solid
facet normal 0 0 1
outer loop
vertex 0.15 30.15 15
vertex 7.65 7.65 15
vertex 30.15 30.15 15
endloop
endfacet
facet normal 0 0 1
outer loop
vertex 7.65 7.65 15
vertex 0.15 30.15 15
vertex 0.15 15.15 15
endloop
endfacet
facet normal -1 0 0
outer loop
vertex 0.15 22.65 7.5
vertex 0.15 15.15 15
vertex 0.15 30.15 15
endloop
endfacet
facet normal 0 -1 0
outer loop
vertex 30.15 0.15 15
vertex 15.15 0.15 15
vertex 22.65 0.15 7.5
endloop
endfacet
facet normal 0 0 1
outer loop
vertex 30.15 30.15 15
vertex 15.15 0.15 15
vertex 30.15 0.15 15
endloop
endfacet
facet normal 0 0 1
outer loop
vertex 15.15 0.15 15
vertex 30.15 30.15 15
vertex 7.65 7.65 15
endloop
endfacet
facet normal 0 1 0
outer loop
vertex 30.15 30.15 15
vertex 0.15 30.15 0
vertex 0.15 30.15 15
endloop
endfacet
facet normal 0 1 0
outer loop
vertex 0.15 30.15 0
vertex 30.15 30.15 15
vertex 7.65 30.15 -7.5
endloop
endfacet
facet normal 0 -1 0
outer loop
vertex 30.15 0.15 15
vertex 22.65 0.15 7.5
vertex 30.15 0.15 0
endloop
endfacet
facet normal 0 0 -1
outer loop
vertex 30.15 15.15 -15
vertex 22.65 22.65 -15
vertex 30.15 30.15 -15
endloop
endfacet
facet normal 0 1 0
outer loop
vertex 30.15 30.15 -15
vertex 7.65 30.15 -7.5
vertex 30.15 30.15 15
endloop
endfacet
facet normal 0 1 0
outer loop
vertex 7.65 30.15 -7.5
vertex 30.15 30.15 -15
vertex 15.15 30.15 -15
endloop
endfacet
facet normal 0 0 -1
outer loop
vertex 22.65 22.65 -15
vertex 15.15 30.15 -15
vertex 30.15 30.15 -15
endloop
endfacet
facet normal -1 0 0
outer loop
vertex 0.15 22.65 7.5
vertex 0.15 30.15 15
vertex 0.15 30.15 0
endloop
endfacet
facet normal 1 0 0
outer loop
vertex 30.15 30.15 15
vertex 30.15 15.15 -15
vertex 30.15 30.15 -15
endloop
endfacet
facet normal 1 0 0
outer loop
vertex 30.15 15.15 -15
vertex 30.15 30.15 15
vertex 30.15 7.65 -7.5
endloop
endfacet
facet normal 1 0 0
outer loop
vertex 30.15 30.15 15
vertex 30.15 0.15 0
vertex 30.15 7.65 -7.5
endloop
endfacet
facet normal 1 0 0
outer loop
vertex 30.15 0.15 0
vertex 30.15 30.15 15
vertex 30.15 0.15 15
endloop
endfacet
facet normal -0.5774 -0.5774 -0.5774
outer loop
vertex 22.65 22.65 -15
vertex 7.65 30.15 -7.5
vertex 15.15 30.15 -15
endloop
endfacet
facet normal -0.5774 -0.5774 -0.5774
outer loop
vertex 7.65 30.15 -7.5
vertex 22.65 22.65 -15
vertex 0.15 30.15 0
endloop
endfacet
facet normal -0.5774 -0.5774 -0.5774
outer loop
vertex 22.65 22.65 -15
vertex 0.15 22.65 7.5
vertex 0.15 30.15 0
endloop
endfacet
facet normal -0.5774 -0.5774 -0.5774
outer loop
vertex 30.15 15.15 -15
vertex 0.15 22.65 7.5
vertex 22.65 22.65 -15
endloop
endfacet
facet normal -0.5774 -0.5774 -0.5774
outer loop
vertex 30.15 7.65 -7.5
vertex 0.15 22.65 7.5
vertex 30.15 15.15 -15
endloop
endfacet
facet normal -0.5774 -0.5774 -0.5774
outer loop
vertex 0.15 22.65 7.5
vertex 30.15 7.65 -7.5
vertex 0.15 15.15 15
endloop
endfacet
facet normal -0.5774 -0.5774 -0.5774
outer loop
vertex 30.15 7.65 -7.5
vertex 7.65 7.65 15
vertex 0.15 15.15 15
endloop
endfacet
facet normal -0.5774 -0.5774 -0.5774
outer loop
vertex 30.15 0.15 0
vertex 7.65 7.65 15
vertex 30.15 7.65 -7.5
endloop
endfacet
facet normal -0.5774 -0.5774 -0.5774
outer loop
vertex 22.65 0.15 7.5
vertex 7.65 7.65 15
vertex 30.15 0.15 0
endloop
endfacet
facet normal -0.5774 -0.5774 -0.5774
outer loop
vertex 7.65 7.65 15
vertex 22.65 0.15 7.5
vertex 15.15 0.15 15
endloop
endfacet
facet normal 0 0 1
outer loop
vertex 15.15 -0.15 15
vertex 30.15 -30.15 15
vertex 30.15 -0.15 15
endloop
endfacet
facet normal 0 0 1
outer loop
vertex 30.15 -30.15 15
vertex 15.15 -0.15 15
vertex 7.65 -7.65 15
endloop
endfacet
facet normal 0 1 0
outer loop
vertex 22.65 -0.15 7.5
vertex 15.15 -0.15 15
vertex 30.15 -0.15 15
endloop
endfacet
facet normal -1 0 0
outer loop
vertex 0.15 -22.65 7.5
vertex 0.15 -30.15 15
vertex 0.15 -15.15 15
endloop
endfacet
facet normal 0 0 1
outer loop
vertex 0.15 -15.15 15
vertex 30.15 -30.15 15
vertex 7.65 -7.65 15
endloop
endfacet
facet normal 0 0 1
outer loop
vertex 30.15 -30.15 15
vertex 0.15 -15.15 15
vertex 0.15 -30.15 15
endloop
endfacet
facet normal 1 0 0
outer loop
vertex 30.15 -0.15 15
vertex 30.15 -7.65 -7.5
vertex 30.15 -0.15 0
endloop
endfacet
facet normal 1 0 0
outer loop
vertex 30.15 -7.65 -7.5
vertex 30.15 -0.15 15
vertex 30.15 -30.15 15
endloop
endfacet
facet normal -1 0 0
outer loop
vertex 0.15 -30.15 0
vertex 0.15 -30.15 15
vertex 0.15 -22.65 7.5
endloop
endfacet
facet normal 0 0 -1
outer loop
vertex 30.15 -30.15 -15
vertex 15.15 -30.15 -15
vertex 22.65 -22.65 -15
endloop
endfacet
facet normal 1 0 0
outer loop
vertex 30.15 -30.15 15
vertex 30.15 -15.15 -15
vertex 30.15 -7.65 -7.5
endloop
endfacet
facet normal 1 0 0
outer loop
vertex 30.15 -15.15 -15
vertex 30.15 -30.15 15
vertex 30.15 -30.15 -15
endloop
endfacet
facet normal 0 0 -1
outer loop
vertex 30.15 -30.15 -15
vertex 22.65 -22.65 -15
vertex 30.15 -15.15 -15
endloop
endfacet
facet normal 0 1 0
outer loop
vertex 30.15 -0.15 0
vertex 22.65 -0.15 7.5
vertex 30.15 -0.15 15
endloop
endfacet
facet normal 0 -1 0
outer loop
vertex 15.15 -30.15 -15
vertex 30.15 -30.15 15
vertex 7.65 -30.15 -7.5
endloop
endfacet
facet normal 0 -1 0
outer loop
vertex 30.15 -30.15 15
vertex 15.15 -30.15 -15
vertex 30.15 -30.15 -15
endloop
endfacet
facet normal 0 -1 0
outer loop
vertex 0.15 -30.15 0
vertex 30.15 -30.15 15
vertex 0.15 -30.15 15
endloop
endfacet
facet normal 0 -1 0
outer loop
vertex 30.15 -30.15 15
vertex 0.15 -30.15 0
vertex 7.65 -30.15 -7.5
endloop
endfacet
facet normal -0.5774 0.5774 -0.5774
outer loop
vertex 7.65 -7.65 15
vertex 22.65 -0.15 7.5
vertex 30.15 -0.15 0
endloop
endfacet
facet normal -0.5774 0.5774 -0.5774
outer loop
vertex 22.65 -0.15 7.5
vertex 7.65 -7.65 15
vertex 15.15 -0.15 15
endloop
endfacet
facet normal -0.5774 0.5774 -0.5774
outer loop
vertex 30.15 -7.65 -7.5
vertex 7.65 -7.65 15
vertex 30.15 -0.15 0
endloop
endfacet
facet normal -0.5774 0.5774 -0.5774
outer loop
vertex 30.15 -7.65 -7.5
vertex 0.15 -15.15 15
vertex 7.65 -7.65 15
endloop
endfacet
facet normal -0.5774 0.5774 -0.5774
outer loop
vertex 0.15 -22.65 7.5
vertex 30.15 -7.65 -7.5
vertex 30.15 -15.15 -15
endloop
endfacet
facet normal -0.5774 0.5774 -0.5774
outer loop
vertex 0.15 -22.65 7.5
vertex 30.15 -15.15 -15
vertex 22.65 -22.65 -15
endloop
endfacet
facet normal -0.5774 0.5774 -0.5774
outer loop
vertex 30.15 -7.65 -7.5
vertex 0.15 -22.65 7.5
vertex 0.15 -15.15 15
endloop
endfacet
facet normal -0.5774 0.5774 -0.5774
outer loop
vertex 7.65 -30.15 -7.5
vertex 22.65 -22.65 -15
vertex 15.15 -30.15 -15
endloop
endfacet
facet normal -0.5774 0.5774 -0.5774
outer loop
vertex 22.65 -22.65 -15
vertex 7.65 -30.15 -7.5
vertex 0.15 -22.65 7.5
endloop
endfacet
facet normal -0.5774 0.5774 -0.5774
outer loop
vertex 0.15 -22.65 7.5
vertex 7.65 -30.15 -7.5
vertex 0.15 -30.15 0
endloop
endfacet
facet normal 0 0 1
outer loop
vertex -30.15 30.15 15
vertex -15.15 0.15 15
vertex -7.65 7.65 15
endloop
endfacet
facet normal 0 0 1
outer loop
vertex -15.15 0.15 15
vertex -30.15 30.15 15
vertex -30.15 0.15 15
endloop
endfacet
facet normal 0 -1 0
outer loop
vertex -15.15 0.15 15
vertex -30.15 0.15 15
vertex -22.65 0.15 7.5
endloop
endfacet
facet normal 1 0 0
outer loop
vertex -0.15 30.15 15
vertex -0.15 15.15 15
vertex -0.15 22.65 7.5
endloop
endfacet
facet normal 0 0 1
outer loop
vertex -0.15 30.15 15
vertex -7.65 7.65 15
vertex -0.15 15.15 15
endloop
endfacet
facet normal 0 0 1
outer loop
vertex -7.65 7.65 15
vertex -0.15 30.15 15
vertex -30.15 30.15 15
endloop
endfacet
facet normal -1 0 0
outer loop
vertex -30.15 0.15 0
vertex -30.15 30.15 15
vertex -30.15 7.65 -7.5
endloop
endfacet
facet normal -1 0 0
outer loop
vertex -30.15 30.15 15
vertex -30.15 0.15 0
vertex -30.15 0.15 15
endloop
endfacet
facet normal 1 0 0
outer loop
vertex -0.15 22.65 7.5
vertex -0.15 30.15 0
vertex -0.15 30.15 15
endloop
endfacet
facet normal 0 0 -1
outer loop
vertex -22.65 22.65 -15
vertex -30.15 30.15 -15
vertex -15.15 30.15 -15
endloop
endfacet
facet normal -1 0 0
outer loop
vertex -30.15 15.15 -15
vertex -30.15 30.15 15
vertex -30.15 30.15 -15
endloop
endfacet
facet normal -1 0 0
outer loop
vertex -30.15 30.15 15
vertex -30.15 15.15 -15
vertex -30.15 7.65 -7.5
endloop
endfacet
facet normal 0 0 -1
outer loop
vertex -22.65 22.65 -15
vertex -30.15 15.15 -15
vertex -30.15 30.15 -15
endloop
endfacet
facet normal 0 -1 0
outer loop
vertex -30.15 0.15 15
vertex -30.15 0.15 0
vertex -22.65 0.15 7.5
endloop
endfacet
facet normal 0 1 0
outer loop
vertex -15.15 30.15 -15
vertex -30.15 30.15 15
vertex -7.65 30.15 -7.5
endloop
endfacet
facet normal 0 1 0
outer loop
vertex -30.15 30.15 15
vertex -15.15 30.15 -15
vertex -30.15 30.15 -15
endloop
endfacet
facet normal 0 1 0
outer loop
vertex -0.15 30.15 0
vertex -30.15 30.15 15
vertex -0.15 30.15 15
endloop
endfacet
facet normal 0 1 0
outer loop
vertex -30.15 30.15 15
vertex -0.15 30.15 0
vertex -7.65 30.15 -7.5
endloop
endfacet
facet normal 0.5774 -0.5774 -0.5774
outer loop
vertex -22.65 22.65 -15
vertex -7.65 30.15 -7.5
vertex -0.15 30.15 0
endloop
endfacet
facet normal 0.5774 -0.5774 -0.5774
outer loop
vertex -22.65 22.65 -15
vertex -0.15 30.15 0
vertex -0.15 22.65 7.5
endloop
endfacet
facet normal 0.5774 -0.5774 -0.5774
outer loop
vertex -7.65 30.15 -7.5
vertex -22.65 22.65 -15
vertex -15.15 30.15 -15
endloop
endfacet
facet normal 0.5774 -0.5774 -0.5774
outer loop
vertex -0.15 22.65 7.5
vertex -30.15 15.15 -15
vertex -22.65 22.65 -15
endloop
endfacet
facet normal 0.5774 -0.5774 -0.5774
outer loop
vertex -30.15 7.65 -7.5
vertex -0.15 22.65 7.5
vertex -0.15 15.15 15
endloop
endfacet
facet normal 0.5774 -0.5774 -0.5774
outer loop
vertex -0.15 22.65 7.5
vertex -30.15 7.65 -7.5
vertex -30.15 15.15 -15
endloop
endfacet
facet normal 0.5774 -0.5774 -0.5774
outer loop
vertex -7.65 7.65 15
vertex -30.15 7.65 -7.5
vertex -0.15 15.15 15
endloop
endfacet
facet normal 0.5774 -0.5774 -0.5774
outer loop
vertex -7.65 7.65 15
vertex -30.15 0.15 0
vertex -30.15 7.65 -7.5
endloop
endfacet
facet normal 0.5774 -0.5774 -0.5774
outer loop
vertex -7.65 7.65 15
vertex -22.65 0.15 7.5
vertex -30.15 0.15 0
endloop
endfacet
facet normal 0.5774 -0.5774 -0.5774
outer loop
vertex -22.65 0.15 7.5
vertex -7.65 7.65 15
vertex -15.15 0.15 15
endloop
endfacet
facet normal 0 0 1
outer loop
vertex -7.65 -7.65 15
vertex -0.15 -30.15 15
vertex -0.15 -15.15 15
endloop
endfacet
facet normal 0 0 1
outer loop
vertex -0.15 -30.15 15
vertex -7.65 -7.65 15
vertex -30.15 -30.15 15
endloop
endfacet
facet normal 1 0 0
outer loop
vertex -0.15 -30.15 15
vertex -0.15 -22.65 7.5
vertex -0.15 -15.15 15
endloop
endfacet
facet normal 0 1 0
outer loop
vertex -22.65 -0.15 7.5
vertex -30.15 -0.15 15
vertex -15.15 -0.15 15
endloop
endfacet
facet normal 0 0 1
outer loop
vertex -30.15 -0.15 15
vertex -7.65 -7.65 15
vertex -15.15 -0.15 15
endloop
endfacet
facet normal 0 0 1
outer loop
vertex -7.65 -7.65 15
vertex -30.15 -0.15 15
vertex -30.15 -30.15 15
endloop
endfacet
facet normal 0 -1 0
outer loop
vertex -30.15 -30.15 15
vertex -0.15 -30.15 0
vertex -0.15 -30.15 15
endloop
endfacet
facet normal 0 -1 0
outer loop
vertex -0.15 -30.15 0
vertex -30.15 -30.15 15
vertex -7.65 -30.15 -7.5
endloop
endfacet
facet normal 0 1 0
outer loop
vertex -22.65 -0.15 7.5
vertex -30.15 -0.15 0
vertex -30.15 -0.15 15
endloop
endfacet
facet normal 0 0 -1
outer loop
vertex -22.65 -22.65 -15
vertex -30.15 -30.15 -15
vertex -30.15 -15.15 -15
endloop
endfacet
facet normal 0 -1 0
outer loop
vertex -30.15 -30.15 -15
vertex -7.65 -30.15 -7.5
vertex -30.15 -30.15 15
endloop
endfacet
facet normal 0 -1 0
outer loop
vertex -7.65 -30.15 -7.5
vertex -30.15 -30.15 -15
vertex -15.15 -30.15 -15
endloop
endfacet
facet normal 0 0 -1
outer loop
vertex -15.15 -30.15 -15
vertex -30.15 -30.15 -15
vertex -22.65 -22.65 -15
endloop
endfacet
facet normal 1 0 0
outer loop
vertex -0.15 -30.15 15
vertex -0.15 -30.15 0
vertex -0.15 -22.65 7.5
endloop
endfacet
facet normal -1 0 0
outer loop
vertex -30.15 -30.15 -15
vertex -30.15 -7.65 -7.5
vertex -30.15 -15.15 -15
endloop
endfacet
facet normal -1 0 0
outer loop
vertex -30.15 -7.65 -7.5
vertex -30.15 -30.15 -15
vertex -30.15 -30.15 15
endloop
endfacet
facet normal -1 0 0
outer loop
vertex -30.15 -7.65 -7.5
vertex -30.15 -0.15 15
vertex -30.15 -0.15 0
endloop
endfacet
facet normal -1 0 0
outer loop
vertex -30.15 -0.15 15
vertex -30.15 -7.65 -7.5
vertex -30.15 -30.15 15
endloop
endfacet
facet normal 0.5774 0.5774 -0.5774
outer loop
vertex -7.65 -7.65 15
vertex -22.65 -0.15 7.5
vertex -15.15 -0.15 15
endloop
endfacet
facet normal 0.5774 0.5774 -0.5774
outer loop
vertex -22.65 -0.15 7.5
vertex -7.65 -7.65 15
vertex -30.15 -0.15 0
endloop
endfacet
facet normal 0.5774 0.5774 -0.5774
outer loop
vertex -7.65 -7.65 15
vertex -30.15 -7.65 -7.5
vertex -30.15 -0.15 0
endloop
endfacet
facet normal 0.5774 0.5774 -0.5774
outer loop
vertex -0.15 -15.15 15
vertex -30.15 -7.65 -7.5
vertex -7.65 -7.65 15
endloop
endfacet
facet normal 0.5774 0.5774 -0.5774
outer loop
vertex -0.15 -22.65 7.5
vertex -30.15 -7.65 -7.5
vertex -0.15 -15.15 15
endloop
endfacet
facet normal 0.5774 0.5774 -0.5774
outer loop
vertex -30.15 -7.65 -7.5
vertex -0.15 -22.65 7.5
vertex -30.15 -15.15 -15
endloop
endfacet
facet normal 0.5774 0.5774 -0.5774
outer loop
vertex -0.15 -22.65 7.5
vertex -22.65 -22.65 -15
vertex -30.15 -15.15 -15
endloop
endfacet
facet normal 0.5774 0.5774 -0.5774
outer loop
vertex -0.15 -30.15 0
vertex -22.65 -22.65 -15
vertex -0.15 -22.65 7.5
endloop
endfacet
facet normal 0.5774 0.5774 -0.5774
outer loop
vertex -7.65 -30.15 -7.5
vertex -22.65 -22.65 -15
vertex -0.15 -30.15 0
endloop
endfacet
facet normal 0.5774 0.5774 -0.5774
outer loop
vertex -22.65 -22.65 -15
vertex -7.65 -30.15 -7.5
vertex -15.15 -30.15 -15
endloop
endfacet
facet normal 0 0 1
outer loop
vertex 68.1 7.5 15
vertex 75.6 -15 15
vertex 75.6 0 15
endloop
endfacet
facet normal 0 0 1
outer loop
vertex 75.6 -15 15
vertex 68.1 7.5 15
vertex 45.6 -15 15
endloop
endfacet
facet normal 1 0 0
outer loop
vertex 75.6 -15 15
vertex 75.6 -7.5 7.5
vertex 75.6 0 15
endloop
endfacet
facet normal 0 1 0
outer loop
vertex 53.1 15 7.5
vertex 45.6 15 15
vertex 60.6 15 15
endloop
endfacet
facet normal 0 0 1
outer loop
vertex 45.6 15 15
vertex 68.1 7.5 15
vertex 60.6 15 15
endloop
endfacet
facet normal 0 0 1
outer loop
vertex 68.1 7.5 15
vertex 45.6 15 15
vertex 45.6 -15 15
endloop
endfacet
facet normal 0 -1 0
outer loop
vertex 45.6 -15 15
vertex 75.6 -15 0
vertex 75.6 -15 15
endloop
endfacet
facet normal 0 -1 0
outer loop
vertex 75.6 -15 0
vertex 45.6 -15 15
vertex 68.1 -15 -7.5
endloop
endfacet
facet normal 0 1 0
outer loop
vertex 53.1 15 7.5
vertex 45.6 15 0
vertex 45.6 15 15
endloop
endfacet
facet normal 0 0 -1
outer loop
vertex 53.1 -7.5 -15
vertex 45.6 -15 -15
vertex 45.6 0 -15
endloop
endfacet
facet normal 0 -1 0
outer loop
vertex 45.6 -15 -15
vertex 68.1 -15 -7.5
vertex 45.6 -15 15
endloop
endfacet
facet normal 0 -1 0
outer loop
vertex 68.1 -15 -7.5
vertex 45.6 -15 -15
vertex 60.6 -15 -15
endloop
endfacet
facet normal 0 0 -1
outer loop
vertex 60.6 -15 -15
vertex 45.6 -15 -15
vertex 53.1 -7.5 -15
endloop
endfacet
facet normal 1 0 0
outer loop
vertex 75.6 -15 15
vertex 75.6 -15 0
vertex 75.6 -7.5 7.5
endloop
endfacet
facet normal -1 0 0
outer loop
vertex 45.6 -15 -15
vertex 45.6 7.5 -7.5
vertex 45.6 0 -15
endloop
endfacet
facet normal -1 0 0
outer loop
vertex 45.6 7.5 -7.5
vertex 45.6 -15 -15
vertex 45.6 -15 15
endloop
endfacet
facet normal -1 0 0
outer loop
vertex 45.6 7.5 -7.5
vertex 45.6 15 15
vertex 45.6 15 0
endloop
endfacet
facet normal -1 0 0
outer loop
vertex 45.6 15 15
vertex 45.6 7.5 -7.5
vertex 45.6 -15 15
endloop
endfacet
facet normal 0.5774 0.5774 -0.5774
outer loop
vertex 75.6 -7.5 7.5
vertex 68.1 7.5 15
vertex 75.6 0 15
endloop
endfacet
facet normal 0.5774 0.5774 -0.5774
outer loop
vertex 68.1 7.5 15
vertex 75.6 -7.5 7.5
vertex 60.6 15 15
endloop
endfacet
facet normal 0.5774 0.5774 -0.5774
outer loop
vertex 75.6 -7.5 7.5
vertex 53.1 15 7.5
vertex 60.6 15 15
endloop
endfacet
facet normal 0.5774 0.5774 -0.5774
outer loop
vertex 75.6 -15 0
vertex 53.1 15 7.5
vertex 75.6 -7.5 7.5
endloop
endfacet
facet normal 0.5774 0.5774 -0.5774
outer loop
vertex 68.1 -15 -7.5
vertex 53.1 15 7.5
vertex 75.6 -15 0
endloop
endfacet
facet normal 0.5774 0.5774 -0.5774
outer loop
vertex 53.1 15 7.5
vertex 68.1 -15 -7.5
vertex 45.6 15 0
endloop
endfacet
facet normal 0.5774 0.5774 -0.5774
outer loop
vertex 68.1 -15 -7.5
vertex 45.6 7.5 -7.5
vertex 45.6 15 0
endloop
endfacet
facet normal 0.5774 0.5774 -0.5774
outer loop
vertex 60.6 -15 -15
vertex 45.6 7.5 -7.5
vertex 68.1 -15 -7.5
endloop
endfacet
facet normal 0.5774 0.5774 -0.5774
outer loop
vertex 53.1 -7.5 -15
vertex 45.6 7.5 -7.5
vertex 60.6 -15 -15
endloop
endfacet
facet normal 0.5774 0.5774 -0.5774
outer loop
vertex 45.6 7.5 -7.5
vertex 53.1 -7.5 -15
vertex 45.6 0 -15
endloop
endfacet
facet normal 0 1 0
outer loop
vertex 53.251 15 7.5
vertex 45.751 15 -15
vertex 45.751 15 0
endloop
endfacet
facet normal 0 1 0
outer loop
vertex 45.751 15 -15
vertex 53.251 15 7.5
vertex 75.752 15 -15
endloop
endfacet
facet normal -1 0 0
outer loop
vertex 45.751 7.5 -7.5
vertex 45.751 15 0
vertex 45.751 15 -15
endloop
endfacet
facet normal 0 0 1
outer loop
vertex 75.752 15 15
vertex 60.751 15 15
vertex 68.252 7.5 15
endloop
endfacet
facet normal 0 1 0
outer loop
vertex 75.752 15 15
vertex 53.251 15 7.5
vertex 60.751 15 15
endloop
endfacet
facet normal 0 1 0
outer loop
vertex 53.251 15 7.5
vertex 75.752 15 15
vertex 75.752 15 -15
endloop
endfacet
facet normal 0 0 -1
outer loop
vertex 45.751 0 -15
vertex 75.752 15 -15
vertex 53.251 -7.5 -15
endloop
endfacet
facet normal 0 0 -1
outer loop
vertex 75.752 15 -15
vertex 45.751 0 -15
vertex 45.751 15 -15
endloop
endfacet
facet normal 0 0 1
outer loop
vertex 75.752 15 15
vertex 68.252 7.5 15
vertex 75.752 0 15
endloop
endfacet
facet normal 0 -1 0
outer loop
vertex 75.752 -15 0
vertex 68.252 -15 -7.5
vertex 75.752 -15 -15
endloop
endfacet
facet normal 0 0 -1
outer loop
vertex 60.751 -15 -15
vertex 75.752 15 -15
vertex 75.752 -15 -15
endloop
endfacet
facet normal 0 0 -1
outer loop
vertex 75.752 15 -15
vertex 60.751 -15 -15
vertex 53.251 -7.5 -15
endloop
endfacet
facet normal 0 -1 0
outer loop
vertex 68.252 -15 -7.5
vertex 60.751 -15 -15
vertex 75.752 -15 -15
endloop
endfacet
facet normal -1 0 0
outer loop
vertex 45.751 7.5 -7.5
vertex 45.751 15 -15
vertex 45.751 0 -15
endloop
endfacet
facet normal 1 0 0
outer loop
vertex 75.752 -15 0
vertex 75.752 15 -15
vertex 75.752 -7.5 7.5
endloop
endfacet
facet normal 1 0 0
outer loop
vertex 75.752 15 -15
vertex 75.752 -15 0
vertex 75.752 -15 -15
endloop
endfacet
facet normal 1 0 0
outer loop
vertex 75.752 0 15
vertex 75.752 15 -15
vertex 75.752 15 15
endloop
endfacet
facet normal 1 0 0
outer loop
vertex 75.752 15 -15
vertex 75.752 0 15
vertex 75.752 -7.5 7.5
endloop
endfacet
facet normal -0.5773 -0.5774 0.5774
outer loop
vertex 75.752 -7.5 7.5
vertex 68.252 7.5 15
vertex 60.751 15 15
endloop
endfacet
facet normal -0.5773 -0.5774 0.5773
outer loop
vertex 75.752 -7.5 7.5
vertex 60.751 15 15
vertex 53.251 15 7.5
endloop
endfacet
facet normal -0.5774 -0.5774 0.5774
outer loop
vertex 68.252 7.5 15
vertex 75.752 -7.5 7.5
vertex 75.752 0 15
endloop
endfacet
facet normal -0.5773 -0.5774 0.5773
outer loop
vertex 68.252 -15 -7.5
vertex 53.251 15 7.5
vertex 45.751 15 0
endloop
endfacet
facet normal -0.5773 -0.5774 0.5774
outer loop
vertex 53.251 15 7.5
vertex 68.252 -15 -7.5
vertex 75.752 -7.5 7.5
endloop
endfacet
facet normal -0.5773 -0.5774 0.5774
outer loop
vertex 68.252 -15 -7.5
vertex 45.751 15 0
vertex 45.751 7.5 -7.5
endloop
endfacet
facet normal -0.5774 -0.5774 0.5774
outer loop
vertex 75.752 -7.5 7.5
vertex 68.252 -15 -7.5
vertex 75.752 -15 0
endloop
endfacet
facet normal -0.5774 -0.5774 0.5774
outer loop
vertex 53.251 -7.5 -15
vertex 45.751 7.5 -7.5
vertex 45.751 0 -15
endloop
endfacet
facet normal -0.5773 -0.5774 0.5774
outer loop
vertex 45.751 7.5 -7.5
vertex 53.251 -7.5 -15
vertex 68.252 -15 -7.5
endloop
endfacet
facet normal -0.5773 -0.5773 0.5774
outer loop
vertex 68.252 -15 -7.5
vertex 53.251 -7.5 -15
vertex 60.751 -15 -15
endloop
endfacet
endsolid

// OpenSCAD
// Menger Sponge

// Size of edge of sponge
D = 30;
ATOM = 0.01;

module part(x, y, angle, angle2=0, color="blue") {
    color(color)
    translate([D*x/2*1.01, D*y/2*1.01, 0])
    rotate([-45, angle2, angle])
    rotate([0, -atan(1/sqrt(2)), 0])
    difference() {
        rotate([45, atan(1/sqrt(2)), 0]) {  //menger();
            difference() {
                cube(D, true);
                //cube(D*.9, true);
            }
        }
        translate([0,0,-D]) cube(2*D, center=true);
    }
}


part(1, 1,  -90);
part(1, -1, 180);
part(-1, 1,   0);
part(-1, -1, 90);


part(4, 0, 90);
part(4.01, 0, -90, -90);
